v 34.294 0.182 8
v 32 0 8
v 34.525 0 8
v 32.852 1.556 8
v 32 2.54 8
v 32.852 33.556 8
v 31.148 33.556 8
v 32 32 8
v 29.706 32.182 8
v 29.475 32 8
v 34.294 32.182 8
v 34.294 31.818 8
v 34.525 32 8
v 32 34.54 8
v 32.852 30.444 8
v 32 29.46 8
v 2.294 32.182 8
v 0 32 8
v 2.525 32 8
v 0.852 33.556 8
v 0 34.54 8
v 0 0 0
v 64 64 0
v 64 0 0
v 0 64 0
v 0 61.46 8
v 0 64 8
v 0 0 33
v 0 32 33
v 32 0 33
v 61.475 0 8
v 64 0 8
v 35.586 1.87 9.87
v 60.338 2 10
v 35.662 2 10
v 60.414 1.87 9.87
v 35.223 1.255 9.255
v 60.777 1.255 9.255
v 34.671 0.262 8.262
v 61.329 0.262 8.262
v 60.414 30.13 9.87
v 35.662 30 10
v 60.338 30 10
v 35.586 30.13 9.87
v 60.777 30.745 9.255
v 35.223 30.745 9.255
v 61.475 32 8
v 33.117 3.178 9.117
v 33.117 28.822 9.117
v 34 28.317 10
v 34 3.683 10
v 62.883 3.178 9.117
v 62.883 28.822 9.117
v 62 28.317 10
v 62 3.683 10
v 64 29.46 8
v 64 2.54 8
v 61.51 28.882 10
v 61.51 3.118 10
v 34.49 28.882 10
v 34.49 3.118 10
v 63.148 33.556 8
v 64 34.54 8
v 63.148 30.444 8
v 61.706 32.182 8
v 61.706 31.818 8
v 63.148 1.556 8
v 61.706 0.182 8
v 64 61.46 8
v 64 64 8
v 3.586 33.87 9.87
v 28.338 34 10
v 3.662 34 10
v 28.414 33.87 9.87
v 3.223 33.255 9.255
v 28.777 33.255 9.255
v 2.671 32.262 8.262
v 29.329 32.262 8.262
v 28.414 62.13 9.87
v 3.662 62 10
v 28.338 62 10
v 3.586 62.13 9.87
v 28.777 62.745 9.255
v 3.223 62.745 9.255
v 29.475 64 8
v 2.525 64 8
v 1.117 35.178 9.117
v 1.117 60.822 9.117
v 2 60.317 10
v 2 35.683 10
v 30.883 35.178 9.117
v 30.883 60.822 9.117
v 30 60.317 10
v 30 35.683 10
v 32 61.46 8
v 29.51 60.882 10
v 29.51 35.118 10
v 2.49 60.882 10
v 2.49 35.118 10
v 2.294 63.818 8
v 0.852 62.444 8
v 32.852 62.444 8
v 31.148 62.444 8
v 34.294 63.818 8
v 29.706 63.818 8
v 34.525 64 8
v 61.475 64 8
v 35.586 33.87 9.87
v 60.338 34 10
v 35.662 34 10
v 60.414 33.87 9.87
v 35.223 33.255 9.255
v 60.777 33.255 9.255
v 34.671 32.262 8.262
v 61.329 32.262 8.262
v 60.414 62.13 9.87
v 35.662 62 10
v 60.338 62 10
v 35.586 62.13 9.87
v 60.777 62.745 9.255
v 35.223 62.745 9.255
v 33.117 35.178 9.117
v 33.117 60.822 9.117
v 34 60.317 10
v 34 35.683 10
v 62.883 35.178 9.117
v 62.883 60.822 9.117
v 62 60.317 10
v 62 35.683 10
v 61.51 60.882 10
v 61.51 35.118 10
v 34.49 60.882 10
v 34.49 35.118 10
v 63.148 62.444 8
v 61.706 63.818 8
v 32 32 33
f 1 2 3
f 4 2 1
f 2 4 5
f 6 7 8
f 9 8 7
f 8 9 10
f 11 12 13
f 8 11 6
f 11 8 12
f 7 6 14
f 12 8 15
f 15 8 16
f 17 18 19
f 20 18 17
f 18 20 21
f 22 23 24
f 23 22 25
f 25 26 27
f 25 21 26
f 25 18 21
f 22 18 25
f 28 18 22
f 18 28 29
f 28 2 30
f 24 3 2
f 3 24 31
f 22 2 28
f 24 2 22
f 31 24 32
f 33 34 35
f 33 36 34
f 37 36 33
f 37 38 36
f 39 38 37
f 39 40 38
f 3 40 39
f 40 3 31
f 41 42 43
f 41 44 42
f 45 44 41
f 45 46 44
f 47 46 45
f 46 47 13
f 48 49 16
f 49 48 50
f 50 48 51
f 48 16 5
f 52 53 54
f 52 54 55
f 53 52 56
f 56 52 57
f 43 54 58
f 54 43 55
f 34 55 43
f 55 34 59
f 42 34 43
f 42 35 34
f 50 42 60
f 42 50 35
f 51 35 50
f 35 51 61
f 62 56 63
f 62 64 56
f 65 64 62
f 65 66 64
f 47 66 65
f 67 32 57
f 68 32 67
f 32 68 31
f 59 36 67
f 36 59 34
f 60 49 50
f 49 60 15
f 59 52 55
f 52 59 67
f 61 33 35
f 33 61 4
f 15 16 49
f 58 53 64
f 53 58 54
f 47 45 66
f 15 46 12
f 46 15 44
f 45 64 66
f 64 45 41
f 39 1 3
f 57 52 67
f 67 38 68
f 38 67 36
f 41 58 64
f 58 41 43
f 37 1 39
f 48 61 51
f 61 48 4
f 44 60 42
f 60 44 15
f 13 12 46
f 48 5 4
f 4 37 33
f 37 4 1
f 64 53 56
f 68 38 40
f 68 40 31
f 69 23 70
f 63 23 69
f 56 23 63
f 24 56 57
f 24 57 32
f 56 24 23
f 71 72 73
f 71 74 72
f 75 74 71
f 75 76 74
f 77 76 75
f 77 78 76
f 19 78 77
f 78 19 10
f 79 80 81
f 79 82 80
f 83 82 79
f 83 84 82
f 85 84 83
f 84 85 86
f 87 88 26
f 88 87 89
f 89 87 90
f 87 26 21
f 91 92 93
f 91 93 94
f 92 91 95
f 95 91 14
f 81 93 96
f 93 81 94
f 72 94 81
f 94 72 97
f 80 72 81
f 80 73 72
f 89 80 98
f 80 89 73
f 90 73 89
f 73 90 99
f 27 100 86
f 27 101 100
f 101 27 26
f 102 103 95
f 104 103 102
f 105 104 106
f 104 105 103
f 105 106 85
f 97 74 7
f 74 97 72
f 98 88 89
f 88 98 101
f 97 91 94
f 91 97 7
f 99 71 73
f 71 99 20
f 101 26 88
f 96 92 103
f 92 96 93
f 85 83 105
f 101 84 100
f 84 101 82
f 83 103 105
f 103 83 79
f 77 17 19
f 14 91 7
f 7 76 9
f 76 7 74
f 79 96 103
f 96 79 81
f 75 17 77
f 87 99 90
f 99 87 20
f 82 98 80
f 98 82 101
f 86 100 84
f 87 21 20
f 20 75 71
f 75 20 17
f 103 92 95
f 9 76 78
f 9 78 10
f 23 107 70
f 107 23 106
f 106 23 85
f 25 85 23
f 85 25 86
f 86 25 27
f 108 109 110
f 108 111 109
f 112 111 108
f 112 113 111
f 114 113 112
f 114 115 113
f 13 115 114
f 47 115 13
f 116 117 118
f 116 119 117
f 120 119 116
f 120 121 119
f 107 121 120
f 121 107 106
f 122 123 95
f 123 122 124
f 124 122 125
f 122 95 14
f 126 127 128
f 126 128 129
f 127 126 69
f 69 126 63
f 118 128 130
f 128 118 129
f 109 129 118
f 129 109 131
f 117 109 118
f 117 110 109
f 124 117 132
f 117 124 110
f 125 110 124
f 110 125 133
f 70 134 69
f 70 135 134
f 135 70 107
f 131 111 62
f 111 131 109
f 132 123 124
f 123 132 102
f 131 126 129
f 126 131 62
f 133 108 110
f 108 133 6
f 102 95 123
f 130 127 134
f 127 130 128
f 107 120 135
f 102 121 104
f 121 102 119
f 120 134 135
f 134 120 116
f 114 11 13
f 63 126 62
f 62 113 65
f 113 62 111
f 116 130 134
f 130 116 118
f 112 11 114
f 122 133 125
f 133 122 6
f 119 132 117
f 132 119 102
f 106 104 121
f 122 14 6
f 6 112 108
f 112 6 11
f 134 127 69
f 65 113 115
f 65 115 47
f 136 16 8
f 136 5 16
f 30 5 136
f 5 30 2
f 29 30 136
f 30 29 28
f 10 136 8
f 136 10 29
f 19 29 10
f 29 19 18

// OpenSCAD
// file: ModularDungeonTileLibrary.scad
//Constants
wallleft = 0;
wallbottom = 1;
wallright = 2;
walltop = 3;
wallcenter = 4;
walldoubleright = 5;


//Variables
size = 32;
connectorlength = size-10;
connectorwidth = 6;
connectorheight = 4;
baseheight = 8;
topperheight = 2;
topperrounded = true;
walllength = size;
wallheight = 25;
wallwidth = 6;
wallwidththin = 4;


//Functions
function hypotenuse_ra(side_a, side_b) =
    sqrt(pow(side_a, 2) + pow(side_b, 2));
    
    
//Modules    
module mtdl_Base_Connector(cw,cl,ch) {
    translate([-connectorwidth/2,-connectorlength/2,-connectorheight/2]) {
        cube([cw,cl,ch/2]);
        translate([cw/3,0,ch/2])
            cube([cw/3,cl,ch/2]);
        translate([-(cw-2)/2,cl/2-2,0])
            cube([cw+4,4,ch]);
    }
}

module mdtl_Base(s,bh)
{
    cube([s,s,bh]);
}

module mdtl_Topper(s,bh,th,tr)
{
    if (tr) {
        translate([0,0,bh])
            intersection() {
                difference () {
                        cube([s,s,th]);
                        union () {
                        rotate(a=45, v=[1,0,0])
                            cube([s,th*2,th*2]);
                        translate([0,s,0])
                            rotate(a=45, v=[1,0,0])
                                cube([s,th*2,th*2]);
                        rotate(a=-45, v=[0,1,0])
                            cube([th*2,s,th*2]);
                        translate([s,0,0])
                            rotate(a=-45, v=[0,1,0])
                                cube([th*2,s,th*2]);
                        }
                }
                translate([s/2,s/2,0])
                    cylinder(
                        h=th, 
                        r1=hypotenuse_ra(s/2-1.2, s/2-1.2), 
                        r2=hypotenuse_ra(s/2-th-.8, s/2-th-.8), 
                        center=false, 
                        $fa=.1);
            }    
    }
    else {
        translate([0,0,bh])
            difference() {
                cube([s,s,th]);
                union () {
                rotate(a=45, v=[1,0,0])
                    cube([s,th*2,th*2]);
                translate([0,s,0])
                    rotate(a=45, v=[1,0,0])
                        cube([s,th*2,th*2]);
                rotate(a=-45, v=[0,1,0])
                    cube([th*2,s,th*2]);
                translate([s,0,0])
                    rotate(a=-45, v=[0,1,0])
                        cube([th*2,s,th*2]);
                }
            }    
    }
}

module mdtl_Base_1x1(s,bh,th,tr) 
{
    difference () {
        union () {
            mdtl_Base(s,bh);
            mdtl_Topper(s,bh,th,tr);
        }
//        union () {
//            translate([size/2,size,baseheight/2])
//                rotate([0,180,0])
//                    mtdl_Base_Connector(connectorwidth,connectorlength,connectorheight);
//            translate([size/2,0,baseheight/2])
//                rotate([0,180,0])
//                    mtdl_Base_Connector(connectorwidth,connectorlength,connectorheight);
//            translate([size,size/2,baseheight/2])
//                rotate([0,180,90])
//                    mtdl_Base_Connector(connectorwidth,connectorlength,connectorheight);
//            translate([0,size/2,baseheight/2])
//                rotate([0,180,90])
//                    mtdl_Base_Connector(connectorwidth,connectorlength,connectorheight);
//        }
    }
}

module mdtl_Base_1x2(s,bh,th,tr)
{
    union () {
        mdtl_Base_1x1(s,bh,th,tr);
        translate([s,0,0])
            mdtl_Base_1x1(s,bh,th,tr);
    }
}
 
module mdtl_Base_2x2(s,bh,th,tr)
{
    union () {
        mdtl_Base_1x2(s,bh,th,tr);
        translate([0,s,0])
            mdtl_Base_1x2(s,bh,th,tr);
    }
}
 
module mdtl_Base_2x4(s,bh,th,tr)
{
    union () {
        mdtl_Base_2x2(s,bh,th,tr);
        translate([s*2,0,0])
            mdtl_Base_2x2(s,bh,th,tr);
    }
}
 
module mdtl_Base_4x4(s,bh,th,tr)
{
    union () {
        mdtl_Base_2x4(s,bh,th,tr);
        translate([0,s*2,0])
            mdtl_Base_2x4(s,bh,th,tr);
    }
}
 
module mdtl_Wall_1(w,l,h)
{
    translate([0,0,baseheight])
        cube([w,l,h]);   
}

module mdtl_Wall_1_Position(w,l,h,p)
{
    if (p==0) {
        mdtl_Wall_1(w,l,h);
    }
    
    else if (p==1) {
        rotate(a=-90)
           translate([-w,0,0])
               mdtl_Wall_1(w,l,h);       
    }
    
    else if (p==2) {
        translate([(size)-w,0,0])
            mdtl_Wall_1(w,l,h);
    }
    
    else if (p==3) {
        rotate(a=-90)
            translate([-l,0,0])
                mdtl_Wall_1(w,l,h);
    }
    
    else if (p==4) {
        translate([(size)-w/2,0,0])
            mdtl_Wall_1(w,l,h);
    }
    
    else if (p==5) {
        translate([(size*2)-w,0,0])
           mdtl_Wall_1(w,l,h);       
    }
}

module mdtl_Wall_2(w,l,h)
{
    union() {
        mdtl_Wall_1(w,l,h);
        translate([0,l,0])
            mdtl_Wall_1(w,l,h);
    }
}

module mdtl_Wall_2_Position(w,l,h,p)
{
    if (p==0) {
        mdtl_Wall_2(w,l,h);
    }
    
    else if (p==1) {
        rotate(a=-90)
            translate([-w,0,0])
                mdtl_Wall_2(w,l,h);
    }
    
    else if (p==2) {
    translate([(size*2)-w,0,0])
        mdtl_Wall_2(w,l,h);
    }
    
    else if (p==3) {
        rotate(a=-90)
            translate([-l*2,0,0])
                mdtl_Wall_2(w,l,h);
    }
    
    else if (p==4) {
        translate([(size)-w/2,0,0])
            mdtl_Wall_2(w,l,h);
    }
}
// main file
include <ModularDungeonTileLibrary.scad>; 

mdtl_Base_2x2(size,baseheight,topperheight,topperrounded);
//Create Pillar with modified wall
mdtl_Wall_2_Position(size,size/2,wallheight,wallleft);
